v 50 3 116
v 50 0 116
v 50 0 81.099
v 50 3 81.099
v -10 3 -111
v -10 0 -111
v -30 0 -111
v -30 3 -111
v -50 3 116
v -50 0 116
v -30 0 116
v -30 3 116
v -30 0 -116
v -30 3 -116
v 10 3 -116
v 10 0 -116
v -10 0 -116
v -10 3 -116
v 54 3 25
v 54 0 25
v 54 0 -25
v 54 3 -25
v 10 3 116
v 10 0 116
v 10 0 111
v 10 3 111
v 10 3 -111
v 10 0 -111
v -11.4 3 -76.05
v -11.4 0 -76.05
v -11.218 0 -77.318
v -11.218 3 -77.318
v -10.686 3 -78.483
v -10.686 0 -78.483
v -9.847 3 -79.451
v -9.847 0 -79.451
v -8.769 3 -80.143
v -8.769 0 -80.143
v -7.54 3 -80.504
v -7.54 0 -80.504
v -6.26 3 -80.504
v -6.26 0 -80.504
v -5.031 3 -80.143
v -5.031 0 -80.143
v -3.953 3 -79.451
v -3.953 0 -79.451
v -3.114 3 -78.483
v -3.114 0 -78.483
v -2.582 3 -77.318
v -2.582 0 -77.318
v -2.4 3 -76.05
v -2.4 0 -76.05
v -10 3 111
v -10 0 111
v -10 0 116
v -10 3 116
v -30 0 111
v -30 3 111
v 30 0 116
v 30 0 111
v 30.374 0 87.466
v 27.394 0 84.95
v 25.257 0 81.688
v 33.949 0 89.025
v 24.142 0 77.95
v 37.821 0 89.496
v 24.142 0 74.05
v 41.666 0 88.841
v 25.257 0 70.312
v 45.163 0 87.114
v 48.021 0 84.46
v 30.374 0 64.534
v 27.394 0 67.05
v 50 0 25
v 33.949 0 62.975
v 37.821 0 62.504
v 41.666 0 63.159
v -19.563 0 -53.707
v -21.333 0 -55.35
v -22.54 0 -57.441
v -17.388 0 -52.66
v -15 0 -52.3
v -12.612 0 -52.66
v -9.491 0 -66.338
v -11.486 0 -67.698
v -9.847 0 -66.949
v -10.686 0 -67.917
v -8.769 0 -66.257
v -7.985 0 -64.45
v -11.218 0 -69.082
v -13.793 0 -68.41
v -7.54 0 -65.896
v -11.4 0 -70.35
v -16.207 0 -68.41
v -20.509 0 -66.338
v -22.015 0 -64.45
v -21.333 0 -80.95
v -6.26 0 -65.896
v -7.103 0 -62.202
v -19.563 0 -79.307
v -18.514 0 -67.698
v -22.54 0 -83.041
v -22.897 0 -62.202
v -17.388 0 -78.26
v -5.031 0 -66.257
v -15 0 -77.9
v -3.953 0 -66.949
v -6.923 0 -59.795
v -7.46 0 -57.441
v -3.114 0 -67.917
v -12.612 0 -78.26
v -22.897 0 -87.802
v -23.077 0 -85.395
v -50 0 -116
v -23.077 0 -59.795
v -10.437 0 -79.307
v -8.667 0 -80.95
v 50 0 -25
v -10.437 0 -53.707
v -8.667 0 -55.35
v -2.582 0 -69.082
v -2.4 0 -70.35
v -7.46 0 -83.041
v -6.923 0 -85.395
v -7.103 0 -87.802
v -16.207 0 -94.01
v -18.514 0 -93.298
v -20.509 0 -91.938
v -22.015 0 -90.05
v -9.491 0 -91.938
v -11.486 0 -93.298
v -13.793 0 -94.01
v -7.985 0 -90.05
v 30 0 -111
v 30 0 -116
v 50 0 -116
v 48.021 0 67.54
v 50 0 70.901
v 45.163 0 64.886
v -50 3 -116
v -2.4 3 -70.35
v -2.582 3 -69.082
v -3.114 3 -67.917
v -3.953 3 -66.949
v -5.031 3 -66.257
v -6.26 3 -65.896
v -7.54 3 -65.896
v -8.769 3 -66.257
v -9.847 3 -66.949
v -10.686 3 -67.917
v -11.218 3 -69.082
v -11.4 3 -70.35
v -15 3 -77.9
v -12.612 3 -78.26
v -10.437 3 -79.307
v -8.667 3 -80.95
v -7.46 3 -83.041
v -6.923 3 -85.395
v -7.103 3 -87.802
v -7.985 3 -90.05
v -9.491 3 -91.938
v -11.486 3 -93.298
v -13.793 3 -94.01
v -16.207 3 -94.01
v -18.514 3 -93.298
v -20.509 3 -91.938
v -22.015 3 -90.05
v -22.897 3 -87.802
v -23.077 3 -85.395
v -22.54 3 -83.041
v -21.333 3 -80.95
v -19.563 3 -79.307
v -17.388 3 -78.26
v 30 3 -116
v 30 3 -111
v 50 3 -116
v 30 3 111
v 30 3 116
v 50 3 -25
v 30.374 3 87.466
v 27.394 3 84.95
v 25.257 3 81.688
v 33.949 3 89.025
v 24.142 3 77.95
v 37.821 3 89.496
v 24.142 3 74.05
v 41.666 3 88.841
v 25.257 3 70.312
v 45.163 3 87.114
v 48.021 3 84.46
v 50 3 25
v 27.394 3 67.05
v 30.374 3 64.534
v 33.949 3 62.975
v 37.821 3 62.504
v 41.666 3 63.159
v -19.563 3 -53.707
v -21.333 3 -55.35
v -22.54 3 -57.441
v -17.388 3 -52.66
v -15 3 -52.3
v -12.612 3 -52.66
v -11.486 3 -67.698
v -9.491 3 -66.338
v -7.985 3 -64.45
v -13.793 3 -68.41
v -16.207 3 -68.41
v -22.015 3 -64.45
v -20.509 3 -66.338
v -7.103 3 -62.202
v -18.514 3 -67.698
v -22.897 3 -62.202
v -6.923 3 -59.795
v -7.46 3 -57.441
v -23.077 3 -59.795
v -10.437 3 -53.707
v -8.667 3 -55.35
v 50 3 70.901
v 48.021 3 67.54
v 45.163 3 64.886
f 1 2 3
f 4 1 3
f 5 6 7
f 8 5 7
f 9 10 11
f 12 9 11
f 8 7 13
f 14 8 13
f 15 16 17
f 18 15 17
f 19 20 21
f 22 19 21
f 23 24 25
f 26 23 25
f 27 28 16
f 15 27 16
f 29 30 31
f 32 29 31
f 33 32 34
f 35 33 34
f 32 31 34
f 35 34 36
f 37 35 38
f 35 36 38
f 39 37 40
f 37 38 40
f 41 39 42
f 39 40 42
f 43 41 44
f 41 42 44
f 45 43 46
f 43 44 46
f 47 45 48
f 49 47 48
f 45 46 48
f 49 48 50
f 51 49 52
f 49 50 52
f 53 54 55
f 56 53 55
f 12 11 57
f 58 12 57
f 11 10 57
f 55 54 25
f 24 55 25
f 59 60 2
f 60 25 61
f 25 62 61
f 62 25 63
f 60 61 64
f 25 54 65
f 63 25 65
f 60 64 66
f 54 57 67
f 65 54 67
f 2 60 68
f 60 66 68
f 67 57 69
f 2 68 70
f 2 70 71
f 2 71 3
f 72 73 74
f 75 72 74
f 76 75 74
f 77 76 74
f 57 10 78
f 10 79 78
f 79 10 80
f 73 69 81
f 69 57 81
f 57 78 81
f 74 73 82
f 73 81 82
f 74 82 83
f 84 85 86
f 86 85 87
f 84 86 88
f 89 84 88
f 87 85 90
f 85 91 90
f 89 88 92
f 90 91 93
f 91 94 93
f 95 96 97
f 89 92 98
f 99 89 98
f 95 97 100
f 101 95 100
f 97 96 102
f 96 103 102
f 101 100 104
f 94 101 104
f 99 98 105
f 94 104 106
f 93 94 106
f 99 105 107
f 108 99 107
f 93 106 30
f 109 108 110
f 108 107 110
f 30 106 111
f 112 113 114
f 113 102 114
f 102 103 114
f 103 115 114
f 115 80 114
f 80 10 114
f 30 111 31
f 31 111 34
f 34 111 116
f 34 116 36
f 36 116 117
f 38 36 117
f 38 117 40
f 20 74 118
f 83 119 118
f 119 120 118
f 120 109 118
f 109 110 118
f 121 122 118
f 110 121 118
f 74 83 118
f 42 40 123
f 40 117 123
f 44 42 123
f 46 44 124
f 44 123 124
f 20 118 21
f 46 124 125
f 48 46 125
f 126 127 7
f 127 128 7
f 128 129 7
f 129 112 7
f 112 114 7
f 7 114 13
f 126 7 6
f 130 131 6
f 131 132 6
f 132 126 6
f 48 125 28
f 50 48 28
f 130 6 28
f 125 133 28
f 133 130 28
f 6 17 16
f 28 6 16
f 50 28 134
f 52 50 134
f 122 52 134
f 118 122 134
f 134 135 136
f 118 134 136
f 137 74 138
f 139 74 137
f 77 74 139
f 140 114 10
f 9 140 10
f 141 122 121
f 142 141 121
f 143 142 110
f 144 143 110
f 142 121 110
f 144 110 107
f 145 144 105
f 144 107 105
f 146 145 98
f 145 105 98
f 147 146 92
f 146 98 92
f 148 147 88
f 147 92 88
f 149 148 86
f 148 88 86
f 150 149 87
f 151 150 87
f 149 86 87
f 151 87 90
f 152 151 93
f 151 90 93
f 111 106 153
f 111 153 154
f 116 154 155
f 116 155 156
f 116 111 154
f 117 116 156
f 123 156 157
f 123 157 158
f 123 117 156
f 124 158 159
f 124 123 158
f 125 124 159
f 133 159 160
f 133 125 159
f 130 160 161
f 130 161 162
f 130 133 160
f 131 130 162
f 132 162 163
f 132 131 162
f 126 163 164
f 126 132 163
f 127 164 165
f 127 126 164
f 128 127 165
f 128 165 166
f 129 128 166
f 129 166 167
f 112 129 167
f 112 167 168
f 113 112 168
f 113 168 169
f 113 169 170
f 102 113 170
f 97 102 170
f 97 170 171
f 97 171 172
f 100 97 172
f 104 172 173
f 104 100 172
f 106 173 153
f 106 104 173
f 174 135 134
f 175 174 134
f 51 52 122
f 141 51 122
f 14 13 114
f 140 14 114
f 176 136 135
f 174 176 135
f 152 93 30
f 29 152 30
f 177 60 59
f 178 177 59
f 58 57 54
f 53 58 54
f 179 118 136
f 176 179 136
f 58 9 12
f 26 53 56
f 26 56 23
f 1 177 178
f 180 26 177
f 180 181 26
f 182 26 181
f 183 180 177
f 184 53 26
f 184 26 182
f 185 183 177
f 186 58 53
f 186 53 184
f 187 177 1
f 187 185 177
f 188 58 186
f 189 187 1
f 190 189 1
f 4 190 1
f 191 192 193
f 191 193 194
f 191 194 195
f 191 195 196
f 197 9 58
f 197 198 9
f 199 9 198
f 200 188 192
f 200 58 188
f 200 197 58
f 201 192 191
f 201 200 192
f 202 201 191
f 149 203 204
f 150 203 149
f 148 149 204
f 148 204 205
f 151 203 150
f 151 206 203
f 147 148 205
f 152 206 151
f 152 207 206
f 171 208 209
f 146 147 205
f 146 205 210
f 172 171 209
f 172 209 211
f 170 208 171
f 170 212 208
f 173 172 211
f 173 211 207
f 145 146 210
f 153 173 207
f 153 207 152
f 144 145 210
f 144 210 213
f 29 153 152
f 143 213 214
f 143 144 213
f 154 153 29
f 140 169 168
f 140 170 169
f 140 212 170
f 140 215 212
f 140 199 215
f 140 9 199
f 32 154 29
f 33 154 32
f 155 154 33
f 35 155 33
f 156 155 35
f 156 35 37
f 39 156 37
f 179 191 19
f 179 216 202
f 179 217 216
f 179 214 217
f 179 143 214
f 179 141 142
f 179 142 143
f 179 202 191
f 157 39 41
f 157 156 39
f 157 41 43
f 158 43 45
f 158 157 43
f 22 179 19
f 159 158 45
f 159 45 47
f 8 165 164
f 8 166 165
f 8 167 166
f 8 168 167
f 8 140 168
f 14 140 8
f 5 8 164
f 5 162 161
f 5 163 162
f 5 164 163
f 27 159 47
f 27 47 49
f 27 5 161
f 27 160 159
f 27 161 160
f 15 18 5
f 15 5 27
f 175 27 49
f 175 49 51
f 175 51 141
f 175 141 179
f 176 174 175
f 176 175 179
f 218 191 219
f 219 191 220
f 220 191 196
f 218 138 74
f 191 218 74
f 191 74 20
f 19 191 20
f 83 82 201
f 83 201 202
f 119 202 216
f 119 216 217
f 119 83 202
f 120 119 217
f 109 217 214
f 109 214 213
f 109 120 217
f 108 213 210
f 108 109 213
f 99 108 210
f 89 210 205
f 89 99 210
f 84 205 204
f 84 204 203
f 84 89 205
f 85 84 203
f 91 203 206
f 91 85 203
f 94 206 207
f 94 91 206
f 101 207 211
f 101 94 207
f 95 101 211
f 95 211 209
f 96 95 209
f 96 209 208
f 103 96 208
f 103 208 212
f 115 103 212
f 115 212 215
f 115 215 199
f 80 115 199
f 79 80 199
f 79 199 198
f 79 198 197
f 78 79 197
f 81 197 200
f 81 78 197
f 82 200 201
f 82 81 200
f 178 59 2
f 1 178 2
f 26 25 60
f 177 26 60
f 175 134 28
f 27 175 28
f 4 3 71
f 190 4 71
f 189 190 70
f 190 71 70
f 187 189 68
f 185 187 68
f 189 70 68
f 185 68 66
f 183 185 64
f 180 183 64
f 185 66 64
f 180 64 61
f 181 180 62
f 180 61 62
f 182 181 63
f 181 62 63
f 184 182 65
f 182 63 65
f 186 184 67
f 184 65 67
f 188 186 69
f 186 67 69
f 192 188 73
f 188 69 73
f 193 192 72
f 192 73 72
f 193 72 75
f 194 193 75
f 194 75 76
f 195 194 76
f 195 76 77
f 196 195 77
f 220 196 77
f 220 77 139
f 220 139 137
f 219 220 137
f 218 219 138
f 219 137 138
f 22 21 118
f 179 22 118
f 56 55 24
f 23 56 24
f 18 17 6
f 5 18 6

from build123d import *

# Parameters (mm, degrees)
SKETCH1_R           = 8.1
BOSS_EXTRUDE1_DEPTH = 3


with BuildPart() as part:
    # Sketch1 → Boss-Extrude1 (new body)
    with BuildSketch(Plane(origin=(0, 0, 0), x_dir=(1, 0, 0), z_dir=(0, 1, 0))):
        with BuildLine():
            Line((-50, -111), (-50, -116))
            Line((-50, -116), (-30, -116))
            Line((-30, -116), (-30, -111))
            Line((-30, -111), (-10, -111))
            Line((-10, -111), (-10, -116))
            Line((-10, -116), (10, -116))
            Line((10, -116), (10, -111))
            Line((10, -111), (30, -111))
            Line((30, -111), (30, -116))
            Line((30, -116), (50, -116))
            Line((50, -116), (50, -111))
            Line((50, -111), (50, -81.099019514))
            ThreePointArc((50, -81.099019514), (24, -76), (50, -70.900980486))
            Line((50, -70.900980486), (50, -25))
            Line((50, -25), (54, -25))
            Line((54, -25), (54, 25))
            Line((54, 25), (50, 25))
            Line((50, 25), (50, 111))
            Line((50, 111), (50, 116))
            Line((50, 116), (30, 116))
            Line((30, 116), (30, 111))
            Line((30, 111), (10, 111))
            Line((10, 111), (10, 116))
            Line((10, 116), (-10, 116))
            Line((-10, 116), (-10, 111))
            Line((-10, 111), (-30, 111))
            Line((-30, 111), (-30, 116))
            Line((-30, 116), (-50, 116))
            Line((-50, 116), (-50, 111))
            Line((-50, 111), (-50, -111))
        make_face()
        with Locations(Location((-15, 60.4, 0), (0, 0, 270))):
            Circle(SKETCH1_R, mode=Mode.SUBTRACT)
        with Locations(Location((-15, 86, 0), (0, 0, 270))):
            Circle(SKETCH1_R, mode=Mode.SUBTRACT)
        with BuildLine():
            Line((-11.4, 70.35), (-11.4, 76.05))
            ThreePointArc((-11.4, 76.05), (-6.9, 80.55), (-2.4, 76.05))
            Line((-2.4, 76.05), (-2.4, 70.35))
            ThreePointArc((-2.4, 70.35), (-6.9, 65.85), (-11.4, 70.35))
        make_face(mode=Mode.SUBTRACT)
    extrude(amount=BOSS_EXTRUDE1_DEPTH)


solid = part.part
